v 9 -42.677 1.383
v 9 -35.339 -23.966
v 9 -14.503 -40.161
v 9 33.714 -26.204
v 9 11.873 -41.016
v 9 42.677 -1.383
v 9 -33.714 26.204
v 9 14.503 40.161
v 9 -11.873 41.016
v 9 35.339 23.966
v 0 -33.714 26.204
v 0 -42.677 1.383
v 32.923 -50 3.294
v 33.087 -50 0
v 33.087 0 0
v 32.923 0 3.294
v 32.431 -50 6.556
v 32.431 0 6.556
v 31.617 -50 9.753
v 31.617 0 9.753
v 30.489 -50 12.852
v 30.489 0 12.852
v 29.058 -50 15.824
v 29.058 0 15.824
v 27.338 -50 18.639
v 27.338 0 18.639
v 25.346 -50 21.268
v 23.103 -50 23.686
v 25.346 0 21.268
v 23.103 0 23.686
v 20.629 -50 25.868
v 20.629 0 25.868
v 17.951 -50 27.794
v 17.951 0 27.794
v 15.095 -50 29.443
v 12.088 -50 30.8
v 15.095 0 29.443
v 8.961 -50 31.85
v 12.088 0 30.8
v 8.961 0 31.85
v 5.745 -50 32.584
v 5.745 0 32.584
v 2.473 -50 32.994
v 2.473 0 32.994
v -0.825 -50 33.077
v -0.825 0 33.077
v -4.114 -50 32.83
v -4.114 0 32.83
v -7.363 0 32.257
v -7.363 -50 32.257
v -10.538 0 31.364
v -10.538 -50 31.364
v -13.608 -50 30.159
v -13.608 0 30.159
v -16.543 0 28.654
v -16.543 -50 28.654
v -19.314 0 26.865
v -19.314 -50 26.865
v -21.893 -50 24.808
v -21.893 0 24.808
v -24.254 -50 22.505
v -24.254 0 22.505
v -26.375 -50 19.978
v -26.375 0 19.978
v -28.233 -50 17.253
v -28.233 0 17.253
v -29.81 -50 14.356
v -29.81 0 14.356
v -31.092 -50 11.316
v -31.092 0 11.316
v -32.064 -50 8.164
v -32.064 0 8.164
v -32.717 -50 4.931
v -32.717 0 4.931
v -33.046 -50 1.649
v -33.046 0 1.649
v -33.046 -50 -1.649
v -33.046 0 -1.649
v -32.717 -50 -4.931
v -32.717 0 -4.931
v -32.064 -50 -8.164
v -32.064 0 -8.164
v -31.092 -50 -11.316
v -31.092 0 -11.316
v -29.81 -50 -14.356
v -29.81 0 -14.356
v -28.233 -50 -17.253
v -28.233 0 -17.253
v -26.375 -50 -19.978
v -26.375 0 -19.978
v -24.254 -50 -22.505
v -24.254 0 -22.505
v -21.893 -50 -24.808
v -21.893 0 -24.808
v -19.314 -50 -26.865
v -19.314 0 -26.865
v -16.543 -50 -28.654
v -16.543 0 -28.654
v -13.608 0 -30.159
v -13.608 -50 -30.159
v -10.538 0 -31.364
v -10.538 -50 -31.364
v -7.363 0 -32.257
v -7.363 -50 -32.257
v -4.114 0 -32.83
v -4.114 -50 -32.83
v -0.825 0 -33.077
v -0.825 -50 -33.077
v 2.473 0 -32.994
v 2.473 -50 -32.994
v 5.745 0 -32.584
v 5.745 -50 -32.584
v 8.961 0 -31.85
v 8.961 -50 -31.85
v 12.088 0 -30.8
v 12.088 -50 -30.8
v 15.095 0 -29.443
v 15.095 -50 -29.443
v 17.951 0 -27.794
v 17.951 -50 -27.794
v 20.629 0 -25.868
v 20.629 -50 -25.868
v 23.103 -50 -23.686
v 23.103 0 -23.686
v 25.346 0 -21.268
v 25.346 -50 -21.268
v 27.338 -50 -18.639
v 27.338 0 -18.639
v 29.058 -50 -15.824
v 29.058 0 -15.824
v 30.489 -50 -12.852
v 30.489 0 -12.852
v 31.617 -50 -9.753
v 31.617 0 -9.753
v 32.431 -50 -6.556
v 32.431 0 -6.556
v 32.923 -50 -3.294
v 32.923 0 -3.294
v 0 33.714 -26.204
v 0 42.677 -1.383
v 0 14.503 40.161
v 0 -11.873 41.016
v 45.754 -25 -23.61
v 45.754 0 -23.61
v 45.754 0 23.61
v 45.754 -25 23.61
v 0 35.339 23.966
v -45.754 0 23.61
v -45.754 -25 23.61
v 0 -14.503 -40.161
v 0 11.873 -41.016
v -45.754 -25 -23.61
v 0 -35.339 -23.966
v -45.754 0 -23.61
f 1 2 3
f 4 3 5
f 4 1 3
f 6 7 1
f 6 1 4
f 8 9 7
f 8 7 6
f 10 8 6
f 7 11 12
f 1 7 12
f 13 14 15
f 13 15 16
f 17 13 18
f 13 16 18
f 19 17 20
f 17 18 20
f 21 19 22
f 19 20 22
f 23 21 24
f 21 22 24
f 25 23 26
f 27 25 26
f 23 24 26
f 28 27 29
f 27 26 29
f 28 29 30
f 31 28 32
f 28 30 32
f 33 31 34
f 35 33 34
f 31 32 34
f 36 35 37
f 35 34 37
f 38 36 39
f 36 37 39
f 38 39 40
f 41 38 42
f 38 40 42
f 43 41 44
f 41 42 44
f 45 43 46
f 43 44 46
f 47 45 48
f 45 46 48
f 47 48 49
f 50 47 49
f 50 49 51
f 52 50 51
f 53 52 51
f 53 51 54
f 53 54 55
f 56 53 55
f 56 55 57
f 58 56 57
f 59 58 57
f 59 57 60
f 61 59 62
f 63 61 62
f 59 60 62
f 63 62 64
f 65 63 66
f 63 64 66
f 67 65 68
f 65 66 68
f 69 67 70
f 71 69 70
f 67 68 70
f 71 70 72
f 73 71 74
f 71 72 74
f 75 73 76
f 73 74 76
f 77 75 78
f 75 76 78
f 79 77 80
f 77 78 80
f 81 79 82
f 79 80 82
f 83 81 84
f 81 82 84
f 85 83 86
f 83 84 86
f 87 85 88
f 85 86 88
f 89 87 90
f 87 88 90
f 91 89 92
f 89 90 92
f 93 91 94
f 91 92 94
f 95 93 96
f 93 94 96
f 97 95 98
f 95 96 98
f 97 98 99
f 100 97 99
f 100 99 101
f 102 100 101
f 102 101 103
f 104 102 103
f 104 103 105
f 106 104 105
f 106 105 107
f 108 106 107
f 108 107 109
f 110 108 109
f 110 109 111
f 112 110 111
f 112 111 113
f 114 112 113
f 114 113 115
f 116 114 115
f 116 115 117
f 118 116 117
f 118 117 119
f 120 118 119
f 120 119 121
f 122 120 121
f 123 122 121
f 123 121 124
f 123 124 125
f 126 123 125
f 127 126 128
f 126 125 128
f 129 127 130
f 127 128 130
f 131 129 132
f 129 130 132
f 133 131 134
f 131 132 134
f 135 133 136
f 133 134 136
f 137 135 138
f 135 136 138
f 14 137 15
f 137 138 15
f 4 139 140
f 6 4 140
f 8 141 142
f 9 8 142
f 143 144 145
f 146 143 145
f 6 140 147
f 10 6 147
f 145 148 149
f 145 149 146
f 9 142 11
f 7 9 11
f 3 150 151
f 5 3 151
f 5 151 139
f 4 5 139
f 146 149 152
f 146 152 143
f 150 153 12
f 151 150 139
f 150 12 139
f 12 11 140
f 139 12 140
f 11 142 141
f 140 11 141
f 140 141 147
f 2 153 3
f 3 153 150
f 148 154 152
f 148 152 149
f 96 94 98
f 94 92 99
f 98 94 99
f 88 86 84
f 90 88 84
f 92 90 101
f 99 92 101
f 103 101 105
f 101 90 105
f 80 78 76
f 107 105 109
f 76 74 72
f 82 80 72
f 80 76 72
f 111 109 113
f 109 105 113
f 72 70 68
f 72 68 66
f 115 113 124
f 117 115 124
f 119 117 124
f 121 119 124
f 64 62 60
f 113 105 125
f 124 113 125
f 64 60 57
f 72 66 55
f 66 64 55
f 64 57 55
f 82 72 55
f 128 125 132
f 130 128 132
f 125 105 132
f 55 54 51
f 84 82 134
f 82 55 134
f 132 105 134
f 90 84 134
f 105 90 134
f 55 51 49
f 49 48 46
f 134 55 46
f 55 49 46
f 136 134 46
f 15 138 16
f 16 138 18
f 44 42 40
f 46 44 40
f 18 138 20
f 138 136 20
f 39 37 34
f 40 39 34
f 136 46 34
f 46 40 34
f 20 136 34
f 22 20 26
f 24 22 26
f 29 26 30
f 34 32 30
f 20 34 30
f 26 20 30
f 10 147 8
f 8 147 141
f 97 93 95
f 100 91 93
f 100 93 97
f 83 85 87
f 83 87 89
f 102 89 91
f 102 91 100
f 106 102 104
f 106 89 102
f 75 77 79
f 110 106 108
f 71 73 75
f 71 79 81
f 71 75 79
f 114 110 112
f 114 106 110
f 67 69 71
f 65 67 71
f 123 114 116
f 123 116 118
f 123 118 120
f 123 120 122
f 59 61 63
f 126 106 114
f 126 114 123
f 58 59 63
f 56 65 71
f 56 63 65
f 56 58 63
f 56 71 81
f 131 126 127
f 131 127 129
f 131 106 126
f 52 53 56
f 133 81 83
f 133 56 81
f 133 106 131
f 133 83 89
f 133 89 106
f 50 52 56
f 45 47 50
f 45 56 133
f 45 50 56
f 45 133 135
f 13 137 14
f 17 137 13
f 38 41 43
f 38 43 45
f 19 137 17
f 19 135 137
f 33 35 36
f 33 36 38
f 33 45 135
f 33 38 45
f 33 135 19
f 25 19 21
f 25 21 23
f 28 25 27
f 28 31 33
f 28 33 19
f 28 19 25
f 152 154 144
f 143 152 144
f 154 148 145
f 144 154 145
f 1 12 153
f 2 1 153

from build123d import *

# Parameters (mm, degrees)
F0_W     = 91.508382
F0_H     = 47.220674
F1_DEPTH = 25
F2_R     = 33.086933
F3_DEPTH = 50
F5_DEPTH = 9


with BuildPart() as f1:
    # F0 (on Front) → F1 (new body)
    with BuildSketch(Plane.XZ):
        Rectangle(F0_W, F0_H)
    extrude(amount=F1_DEPTH)


with BuildPart() as f3:
    # F2 (on Front) → F3 (new body)
    with BuildSketch(Plane.XZ):
        Circle(F2_R)
    extrude(amount=F3_DEPTH)


with BuildPart() as f5:
    # F4 (on Right) → F5 (new body)
    with BuildSketch(Plane.YZ):
        Polygon((42.677343, -1.382692), (35.339422, 23.966492), (14.503043, 40.16129), (-11.873006, 41.015841), (-33.71397, 26.203734), (-42.677343, 1.382692), (-35.339422, -23.966492), (-14.503043, -40.16129), (11.873006, -41.015841), (33.71397, -26.203734), align=None)
    extrude(amount=F5_DEPTH)


solid = Compound([f1.part, f3.part, f5.part])
